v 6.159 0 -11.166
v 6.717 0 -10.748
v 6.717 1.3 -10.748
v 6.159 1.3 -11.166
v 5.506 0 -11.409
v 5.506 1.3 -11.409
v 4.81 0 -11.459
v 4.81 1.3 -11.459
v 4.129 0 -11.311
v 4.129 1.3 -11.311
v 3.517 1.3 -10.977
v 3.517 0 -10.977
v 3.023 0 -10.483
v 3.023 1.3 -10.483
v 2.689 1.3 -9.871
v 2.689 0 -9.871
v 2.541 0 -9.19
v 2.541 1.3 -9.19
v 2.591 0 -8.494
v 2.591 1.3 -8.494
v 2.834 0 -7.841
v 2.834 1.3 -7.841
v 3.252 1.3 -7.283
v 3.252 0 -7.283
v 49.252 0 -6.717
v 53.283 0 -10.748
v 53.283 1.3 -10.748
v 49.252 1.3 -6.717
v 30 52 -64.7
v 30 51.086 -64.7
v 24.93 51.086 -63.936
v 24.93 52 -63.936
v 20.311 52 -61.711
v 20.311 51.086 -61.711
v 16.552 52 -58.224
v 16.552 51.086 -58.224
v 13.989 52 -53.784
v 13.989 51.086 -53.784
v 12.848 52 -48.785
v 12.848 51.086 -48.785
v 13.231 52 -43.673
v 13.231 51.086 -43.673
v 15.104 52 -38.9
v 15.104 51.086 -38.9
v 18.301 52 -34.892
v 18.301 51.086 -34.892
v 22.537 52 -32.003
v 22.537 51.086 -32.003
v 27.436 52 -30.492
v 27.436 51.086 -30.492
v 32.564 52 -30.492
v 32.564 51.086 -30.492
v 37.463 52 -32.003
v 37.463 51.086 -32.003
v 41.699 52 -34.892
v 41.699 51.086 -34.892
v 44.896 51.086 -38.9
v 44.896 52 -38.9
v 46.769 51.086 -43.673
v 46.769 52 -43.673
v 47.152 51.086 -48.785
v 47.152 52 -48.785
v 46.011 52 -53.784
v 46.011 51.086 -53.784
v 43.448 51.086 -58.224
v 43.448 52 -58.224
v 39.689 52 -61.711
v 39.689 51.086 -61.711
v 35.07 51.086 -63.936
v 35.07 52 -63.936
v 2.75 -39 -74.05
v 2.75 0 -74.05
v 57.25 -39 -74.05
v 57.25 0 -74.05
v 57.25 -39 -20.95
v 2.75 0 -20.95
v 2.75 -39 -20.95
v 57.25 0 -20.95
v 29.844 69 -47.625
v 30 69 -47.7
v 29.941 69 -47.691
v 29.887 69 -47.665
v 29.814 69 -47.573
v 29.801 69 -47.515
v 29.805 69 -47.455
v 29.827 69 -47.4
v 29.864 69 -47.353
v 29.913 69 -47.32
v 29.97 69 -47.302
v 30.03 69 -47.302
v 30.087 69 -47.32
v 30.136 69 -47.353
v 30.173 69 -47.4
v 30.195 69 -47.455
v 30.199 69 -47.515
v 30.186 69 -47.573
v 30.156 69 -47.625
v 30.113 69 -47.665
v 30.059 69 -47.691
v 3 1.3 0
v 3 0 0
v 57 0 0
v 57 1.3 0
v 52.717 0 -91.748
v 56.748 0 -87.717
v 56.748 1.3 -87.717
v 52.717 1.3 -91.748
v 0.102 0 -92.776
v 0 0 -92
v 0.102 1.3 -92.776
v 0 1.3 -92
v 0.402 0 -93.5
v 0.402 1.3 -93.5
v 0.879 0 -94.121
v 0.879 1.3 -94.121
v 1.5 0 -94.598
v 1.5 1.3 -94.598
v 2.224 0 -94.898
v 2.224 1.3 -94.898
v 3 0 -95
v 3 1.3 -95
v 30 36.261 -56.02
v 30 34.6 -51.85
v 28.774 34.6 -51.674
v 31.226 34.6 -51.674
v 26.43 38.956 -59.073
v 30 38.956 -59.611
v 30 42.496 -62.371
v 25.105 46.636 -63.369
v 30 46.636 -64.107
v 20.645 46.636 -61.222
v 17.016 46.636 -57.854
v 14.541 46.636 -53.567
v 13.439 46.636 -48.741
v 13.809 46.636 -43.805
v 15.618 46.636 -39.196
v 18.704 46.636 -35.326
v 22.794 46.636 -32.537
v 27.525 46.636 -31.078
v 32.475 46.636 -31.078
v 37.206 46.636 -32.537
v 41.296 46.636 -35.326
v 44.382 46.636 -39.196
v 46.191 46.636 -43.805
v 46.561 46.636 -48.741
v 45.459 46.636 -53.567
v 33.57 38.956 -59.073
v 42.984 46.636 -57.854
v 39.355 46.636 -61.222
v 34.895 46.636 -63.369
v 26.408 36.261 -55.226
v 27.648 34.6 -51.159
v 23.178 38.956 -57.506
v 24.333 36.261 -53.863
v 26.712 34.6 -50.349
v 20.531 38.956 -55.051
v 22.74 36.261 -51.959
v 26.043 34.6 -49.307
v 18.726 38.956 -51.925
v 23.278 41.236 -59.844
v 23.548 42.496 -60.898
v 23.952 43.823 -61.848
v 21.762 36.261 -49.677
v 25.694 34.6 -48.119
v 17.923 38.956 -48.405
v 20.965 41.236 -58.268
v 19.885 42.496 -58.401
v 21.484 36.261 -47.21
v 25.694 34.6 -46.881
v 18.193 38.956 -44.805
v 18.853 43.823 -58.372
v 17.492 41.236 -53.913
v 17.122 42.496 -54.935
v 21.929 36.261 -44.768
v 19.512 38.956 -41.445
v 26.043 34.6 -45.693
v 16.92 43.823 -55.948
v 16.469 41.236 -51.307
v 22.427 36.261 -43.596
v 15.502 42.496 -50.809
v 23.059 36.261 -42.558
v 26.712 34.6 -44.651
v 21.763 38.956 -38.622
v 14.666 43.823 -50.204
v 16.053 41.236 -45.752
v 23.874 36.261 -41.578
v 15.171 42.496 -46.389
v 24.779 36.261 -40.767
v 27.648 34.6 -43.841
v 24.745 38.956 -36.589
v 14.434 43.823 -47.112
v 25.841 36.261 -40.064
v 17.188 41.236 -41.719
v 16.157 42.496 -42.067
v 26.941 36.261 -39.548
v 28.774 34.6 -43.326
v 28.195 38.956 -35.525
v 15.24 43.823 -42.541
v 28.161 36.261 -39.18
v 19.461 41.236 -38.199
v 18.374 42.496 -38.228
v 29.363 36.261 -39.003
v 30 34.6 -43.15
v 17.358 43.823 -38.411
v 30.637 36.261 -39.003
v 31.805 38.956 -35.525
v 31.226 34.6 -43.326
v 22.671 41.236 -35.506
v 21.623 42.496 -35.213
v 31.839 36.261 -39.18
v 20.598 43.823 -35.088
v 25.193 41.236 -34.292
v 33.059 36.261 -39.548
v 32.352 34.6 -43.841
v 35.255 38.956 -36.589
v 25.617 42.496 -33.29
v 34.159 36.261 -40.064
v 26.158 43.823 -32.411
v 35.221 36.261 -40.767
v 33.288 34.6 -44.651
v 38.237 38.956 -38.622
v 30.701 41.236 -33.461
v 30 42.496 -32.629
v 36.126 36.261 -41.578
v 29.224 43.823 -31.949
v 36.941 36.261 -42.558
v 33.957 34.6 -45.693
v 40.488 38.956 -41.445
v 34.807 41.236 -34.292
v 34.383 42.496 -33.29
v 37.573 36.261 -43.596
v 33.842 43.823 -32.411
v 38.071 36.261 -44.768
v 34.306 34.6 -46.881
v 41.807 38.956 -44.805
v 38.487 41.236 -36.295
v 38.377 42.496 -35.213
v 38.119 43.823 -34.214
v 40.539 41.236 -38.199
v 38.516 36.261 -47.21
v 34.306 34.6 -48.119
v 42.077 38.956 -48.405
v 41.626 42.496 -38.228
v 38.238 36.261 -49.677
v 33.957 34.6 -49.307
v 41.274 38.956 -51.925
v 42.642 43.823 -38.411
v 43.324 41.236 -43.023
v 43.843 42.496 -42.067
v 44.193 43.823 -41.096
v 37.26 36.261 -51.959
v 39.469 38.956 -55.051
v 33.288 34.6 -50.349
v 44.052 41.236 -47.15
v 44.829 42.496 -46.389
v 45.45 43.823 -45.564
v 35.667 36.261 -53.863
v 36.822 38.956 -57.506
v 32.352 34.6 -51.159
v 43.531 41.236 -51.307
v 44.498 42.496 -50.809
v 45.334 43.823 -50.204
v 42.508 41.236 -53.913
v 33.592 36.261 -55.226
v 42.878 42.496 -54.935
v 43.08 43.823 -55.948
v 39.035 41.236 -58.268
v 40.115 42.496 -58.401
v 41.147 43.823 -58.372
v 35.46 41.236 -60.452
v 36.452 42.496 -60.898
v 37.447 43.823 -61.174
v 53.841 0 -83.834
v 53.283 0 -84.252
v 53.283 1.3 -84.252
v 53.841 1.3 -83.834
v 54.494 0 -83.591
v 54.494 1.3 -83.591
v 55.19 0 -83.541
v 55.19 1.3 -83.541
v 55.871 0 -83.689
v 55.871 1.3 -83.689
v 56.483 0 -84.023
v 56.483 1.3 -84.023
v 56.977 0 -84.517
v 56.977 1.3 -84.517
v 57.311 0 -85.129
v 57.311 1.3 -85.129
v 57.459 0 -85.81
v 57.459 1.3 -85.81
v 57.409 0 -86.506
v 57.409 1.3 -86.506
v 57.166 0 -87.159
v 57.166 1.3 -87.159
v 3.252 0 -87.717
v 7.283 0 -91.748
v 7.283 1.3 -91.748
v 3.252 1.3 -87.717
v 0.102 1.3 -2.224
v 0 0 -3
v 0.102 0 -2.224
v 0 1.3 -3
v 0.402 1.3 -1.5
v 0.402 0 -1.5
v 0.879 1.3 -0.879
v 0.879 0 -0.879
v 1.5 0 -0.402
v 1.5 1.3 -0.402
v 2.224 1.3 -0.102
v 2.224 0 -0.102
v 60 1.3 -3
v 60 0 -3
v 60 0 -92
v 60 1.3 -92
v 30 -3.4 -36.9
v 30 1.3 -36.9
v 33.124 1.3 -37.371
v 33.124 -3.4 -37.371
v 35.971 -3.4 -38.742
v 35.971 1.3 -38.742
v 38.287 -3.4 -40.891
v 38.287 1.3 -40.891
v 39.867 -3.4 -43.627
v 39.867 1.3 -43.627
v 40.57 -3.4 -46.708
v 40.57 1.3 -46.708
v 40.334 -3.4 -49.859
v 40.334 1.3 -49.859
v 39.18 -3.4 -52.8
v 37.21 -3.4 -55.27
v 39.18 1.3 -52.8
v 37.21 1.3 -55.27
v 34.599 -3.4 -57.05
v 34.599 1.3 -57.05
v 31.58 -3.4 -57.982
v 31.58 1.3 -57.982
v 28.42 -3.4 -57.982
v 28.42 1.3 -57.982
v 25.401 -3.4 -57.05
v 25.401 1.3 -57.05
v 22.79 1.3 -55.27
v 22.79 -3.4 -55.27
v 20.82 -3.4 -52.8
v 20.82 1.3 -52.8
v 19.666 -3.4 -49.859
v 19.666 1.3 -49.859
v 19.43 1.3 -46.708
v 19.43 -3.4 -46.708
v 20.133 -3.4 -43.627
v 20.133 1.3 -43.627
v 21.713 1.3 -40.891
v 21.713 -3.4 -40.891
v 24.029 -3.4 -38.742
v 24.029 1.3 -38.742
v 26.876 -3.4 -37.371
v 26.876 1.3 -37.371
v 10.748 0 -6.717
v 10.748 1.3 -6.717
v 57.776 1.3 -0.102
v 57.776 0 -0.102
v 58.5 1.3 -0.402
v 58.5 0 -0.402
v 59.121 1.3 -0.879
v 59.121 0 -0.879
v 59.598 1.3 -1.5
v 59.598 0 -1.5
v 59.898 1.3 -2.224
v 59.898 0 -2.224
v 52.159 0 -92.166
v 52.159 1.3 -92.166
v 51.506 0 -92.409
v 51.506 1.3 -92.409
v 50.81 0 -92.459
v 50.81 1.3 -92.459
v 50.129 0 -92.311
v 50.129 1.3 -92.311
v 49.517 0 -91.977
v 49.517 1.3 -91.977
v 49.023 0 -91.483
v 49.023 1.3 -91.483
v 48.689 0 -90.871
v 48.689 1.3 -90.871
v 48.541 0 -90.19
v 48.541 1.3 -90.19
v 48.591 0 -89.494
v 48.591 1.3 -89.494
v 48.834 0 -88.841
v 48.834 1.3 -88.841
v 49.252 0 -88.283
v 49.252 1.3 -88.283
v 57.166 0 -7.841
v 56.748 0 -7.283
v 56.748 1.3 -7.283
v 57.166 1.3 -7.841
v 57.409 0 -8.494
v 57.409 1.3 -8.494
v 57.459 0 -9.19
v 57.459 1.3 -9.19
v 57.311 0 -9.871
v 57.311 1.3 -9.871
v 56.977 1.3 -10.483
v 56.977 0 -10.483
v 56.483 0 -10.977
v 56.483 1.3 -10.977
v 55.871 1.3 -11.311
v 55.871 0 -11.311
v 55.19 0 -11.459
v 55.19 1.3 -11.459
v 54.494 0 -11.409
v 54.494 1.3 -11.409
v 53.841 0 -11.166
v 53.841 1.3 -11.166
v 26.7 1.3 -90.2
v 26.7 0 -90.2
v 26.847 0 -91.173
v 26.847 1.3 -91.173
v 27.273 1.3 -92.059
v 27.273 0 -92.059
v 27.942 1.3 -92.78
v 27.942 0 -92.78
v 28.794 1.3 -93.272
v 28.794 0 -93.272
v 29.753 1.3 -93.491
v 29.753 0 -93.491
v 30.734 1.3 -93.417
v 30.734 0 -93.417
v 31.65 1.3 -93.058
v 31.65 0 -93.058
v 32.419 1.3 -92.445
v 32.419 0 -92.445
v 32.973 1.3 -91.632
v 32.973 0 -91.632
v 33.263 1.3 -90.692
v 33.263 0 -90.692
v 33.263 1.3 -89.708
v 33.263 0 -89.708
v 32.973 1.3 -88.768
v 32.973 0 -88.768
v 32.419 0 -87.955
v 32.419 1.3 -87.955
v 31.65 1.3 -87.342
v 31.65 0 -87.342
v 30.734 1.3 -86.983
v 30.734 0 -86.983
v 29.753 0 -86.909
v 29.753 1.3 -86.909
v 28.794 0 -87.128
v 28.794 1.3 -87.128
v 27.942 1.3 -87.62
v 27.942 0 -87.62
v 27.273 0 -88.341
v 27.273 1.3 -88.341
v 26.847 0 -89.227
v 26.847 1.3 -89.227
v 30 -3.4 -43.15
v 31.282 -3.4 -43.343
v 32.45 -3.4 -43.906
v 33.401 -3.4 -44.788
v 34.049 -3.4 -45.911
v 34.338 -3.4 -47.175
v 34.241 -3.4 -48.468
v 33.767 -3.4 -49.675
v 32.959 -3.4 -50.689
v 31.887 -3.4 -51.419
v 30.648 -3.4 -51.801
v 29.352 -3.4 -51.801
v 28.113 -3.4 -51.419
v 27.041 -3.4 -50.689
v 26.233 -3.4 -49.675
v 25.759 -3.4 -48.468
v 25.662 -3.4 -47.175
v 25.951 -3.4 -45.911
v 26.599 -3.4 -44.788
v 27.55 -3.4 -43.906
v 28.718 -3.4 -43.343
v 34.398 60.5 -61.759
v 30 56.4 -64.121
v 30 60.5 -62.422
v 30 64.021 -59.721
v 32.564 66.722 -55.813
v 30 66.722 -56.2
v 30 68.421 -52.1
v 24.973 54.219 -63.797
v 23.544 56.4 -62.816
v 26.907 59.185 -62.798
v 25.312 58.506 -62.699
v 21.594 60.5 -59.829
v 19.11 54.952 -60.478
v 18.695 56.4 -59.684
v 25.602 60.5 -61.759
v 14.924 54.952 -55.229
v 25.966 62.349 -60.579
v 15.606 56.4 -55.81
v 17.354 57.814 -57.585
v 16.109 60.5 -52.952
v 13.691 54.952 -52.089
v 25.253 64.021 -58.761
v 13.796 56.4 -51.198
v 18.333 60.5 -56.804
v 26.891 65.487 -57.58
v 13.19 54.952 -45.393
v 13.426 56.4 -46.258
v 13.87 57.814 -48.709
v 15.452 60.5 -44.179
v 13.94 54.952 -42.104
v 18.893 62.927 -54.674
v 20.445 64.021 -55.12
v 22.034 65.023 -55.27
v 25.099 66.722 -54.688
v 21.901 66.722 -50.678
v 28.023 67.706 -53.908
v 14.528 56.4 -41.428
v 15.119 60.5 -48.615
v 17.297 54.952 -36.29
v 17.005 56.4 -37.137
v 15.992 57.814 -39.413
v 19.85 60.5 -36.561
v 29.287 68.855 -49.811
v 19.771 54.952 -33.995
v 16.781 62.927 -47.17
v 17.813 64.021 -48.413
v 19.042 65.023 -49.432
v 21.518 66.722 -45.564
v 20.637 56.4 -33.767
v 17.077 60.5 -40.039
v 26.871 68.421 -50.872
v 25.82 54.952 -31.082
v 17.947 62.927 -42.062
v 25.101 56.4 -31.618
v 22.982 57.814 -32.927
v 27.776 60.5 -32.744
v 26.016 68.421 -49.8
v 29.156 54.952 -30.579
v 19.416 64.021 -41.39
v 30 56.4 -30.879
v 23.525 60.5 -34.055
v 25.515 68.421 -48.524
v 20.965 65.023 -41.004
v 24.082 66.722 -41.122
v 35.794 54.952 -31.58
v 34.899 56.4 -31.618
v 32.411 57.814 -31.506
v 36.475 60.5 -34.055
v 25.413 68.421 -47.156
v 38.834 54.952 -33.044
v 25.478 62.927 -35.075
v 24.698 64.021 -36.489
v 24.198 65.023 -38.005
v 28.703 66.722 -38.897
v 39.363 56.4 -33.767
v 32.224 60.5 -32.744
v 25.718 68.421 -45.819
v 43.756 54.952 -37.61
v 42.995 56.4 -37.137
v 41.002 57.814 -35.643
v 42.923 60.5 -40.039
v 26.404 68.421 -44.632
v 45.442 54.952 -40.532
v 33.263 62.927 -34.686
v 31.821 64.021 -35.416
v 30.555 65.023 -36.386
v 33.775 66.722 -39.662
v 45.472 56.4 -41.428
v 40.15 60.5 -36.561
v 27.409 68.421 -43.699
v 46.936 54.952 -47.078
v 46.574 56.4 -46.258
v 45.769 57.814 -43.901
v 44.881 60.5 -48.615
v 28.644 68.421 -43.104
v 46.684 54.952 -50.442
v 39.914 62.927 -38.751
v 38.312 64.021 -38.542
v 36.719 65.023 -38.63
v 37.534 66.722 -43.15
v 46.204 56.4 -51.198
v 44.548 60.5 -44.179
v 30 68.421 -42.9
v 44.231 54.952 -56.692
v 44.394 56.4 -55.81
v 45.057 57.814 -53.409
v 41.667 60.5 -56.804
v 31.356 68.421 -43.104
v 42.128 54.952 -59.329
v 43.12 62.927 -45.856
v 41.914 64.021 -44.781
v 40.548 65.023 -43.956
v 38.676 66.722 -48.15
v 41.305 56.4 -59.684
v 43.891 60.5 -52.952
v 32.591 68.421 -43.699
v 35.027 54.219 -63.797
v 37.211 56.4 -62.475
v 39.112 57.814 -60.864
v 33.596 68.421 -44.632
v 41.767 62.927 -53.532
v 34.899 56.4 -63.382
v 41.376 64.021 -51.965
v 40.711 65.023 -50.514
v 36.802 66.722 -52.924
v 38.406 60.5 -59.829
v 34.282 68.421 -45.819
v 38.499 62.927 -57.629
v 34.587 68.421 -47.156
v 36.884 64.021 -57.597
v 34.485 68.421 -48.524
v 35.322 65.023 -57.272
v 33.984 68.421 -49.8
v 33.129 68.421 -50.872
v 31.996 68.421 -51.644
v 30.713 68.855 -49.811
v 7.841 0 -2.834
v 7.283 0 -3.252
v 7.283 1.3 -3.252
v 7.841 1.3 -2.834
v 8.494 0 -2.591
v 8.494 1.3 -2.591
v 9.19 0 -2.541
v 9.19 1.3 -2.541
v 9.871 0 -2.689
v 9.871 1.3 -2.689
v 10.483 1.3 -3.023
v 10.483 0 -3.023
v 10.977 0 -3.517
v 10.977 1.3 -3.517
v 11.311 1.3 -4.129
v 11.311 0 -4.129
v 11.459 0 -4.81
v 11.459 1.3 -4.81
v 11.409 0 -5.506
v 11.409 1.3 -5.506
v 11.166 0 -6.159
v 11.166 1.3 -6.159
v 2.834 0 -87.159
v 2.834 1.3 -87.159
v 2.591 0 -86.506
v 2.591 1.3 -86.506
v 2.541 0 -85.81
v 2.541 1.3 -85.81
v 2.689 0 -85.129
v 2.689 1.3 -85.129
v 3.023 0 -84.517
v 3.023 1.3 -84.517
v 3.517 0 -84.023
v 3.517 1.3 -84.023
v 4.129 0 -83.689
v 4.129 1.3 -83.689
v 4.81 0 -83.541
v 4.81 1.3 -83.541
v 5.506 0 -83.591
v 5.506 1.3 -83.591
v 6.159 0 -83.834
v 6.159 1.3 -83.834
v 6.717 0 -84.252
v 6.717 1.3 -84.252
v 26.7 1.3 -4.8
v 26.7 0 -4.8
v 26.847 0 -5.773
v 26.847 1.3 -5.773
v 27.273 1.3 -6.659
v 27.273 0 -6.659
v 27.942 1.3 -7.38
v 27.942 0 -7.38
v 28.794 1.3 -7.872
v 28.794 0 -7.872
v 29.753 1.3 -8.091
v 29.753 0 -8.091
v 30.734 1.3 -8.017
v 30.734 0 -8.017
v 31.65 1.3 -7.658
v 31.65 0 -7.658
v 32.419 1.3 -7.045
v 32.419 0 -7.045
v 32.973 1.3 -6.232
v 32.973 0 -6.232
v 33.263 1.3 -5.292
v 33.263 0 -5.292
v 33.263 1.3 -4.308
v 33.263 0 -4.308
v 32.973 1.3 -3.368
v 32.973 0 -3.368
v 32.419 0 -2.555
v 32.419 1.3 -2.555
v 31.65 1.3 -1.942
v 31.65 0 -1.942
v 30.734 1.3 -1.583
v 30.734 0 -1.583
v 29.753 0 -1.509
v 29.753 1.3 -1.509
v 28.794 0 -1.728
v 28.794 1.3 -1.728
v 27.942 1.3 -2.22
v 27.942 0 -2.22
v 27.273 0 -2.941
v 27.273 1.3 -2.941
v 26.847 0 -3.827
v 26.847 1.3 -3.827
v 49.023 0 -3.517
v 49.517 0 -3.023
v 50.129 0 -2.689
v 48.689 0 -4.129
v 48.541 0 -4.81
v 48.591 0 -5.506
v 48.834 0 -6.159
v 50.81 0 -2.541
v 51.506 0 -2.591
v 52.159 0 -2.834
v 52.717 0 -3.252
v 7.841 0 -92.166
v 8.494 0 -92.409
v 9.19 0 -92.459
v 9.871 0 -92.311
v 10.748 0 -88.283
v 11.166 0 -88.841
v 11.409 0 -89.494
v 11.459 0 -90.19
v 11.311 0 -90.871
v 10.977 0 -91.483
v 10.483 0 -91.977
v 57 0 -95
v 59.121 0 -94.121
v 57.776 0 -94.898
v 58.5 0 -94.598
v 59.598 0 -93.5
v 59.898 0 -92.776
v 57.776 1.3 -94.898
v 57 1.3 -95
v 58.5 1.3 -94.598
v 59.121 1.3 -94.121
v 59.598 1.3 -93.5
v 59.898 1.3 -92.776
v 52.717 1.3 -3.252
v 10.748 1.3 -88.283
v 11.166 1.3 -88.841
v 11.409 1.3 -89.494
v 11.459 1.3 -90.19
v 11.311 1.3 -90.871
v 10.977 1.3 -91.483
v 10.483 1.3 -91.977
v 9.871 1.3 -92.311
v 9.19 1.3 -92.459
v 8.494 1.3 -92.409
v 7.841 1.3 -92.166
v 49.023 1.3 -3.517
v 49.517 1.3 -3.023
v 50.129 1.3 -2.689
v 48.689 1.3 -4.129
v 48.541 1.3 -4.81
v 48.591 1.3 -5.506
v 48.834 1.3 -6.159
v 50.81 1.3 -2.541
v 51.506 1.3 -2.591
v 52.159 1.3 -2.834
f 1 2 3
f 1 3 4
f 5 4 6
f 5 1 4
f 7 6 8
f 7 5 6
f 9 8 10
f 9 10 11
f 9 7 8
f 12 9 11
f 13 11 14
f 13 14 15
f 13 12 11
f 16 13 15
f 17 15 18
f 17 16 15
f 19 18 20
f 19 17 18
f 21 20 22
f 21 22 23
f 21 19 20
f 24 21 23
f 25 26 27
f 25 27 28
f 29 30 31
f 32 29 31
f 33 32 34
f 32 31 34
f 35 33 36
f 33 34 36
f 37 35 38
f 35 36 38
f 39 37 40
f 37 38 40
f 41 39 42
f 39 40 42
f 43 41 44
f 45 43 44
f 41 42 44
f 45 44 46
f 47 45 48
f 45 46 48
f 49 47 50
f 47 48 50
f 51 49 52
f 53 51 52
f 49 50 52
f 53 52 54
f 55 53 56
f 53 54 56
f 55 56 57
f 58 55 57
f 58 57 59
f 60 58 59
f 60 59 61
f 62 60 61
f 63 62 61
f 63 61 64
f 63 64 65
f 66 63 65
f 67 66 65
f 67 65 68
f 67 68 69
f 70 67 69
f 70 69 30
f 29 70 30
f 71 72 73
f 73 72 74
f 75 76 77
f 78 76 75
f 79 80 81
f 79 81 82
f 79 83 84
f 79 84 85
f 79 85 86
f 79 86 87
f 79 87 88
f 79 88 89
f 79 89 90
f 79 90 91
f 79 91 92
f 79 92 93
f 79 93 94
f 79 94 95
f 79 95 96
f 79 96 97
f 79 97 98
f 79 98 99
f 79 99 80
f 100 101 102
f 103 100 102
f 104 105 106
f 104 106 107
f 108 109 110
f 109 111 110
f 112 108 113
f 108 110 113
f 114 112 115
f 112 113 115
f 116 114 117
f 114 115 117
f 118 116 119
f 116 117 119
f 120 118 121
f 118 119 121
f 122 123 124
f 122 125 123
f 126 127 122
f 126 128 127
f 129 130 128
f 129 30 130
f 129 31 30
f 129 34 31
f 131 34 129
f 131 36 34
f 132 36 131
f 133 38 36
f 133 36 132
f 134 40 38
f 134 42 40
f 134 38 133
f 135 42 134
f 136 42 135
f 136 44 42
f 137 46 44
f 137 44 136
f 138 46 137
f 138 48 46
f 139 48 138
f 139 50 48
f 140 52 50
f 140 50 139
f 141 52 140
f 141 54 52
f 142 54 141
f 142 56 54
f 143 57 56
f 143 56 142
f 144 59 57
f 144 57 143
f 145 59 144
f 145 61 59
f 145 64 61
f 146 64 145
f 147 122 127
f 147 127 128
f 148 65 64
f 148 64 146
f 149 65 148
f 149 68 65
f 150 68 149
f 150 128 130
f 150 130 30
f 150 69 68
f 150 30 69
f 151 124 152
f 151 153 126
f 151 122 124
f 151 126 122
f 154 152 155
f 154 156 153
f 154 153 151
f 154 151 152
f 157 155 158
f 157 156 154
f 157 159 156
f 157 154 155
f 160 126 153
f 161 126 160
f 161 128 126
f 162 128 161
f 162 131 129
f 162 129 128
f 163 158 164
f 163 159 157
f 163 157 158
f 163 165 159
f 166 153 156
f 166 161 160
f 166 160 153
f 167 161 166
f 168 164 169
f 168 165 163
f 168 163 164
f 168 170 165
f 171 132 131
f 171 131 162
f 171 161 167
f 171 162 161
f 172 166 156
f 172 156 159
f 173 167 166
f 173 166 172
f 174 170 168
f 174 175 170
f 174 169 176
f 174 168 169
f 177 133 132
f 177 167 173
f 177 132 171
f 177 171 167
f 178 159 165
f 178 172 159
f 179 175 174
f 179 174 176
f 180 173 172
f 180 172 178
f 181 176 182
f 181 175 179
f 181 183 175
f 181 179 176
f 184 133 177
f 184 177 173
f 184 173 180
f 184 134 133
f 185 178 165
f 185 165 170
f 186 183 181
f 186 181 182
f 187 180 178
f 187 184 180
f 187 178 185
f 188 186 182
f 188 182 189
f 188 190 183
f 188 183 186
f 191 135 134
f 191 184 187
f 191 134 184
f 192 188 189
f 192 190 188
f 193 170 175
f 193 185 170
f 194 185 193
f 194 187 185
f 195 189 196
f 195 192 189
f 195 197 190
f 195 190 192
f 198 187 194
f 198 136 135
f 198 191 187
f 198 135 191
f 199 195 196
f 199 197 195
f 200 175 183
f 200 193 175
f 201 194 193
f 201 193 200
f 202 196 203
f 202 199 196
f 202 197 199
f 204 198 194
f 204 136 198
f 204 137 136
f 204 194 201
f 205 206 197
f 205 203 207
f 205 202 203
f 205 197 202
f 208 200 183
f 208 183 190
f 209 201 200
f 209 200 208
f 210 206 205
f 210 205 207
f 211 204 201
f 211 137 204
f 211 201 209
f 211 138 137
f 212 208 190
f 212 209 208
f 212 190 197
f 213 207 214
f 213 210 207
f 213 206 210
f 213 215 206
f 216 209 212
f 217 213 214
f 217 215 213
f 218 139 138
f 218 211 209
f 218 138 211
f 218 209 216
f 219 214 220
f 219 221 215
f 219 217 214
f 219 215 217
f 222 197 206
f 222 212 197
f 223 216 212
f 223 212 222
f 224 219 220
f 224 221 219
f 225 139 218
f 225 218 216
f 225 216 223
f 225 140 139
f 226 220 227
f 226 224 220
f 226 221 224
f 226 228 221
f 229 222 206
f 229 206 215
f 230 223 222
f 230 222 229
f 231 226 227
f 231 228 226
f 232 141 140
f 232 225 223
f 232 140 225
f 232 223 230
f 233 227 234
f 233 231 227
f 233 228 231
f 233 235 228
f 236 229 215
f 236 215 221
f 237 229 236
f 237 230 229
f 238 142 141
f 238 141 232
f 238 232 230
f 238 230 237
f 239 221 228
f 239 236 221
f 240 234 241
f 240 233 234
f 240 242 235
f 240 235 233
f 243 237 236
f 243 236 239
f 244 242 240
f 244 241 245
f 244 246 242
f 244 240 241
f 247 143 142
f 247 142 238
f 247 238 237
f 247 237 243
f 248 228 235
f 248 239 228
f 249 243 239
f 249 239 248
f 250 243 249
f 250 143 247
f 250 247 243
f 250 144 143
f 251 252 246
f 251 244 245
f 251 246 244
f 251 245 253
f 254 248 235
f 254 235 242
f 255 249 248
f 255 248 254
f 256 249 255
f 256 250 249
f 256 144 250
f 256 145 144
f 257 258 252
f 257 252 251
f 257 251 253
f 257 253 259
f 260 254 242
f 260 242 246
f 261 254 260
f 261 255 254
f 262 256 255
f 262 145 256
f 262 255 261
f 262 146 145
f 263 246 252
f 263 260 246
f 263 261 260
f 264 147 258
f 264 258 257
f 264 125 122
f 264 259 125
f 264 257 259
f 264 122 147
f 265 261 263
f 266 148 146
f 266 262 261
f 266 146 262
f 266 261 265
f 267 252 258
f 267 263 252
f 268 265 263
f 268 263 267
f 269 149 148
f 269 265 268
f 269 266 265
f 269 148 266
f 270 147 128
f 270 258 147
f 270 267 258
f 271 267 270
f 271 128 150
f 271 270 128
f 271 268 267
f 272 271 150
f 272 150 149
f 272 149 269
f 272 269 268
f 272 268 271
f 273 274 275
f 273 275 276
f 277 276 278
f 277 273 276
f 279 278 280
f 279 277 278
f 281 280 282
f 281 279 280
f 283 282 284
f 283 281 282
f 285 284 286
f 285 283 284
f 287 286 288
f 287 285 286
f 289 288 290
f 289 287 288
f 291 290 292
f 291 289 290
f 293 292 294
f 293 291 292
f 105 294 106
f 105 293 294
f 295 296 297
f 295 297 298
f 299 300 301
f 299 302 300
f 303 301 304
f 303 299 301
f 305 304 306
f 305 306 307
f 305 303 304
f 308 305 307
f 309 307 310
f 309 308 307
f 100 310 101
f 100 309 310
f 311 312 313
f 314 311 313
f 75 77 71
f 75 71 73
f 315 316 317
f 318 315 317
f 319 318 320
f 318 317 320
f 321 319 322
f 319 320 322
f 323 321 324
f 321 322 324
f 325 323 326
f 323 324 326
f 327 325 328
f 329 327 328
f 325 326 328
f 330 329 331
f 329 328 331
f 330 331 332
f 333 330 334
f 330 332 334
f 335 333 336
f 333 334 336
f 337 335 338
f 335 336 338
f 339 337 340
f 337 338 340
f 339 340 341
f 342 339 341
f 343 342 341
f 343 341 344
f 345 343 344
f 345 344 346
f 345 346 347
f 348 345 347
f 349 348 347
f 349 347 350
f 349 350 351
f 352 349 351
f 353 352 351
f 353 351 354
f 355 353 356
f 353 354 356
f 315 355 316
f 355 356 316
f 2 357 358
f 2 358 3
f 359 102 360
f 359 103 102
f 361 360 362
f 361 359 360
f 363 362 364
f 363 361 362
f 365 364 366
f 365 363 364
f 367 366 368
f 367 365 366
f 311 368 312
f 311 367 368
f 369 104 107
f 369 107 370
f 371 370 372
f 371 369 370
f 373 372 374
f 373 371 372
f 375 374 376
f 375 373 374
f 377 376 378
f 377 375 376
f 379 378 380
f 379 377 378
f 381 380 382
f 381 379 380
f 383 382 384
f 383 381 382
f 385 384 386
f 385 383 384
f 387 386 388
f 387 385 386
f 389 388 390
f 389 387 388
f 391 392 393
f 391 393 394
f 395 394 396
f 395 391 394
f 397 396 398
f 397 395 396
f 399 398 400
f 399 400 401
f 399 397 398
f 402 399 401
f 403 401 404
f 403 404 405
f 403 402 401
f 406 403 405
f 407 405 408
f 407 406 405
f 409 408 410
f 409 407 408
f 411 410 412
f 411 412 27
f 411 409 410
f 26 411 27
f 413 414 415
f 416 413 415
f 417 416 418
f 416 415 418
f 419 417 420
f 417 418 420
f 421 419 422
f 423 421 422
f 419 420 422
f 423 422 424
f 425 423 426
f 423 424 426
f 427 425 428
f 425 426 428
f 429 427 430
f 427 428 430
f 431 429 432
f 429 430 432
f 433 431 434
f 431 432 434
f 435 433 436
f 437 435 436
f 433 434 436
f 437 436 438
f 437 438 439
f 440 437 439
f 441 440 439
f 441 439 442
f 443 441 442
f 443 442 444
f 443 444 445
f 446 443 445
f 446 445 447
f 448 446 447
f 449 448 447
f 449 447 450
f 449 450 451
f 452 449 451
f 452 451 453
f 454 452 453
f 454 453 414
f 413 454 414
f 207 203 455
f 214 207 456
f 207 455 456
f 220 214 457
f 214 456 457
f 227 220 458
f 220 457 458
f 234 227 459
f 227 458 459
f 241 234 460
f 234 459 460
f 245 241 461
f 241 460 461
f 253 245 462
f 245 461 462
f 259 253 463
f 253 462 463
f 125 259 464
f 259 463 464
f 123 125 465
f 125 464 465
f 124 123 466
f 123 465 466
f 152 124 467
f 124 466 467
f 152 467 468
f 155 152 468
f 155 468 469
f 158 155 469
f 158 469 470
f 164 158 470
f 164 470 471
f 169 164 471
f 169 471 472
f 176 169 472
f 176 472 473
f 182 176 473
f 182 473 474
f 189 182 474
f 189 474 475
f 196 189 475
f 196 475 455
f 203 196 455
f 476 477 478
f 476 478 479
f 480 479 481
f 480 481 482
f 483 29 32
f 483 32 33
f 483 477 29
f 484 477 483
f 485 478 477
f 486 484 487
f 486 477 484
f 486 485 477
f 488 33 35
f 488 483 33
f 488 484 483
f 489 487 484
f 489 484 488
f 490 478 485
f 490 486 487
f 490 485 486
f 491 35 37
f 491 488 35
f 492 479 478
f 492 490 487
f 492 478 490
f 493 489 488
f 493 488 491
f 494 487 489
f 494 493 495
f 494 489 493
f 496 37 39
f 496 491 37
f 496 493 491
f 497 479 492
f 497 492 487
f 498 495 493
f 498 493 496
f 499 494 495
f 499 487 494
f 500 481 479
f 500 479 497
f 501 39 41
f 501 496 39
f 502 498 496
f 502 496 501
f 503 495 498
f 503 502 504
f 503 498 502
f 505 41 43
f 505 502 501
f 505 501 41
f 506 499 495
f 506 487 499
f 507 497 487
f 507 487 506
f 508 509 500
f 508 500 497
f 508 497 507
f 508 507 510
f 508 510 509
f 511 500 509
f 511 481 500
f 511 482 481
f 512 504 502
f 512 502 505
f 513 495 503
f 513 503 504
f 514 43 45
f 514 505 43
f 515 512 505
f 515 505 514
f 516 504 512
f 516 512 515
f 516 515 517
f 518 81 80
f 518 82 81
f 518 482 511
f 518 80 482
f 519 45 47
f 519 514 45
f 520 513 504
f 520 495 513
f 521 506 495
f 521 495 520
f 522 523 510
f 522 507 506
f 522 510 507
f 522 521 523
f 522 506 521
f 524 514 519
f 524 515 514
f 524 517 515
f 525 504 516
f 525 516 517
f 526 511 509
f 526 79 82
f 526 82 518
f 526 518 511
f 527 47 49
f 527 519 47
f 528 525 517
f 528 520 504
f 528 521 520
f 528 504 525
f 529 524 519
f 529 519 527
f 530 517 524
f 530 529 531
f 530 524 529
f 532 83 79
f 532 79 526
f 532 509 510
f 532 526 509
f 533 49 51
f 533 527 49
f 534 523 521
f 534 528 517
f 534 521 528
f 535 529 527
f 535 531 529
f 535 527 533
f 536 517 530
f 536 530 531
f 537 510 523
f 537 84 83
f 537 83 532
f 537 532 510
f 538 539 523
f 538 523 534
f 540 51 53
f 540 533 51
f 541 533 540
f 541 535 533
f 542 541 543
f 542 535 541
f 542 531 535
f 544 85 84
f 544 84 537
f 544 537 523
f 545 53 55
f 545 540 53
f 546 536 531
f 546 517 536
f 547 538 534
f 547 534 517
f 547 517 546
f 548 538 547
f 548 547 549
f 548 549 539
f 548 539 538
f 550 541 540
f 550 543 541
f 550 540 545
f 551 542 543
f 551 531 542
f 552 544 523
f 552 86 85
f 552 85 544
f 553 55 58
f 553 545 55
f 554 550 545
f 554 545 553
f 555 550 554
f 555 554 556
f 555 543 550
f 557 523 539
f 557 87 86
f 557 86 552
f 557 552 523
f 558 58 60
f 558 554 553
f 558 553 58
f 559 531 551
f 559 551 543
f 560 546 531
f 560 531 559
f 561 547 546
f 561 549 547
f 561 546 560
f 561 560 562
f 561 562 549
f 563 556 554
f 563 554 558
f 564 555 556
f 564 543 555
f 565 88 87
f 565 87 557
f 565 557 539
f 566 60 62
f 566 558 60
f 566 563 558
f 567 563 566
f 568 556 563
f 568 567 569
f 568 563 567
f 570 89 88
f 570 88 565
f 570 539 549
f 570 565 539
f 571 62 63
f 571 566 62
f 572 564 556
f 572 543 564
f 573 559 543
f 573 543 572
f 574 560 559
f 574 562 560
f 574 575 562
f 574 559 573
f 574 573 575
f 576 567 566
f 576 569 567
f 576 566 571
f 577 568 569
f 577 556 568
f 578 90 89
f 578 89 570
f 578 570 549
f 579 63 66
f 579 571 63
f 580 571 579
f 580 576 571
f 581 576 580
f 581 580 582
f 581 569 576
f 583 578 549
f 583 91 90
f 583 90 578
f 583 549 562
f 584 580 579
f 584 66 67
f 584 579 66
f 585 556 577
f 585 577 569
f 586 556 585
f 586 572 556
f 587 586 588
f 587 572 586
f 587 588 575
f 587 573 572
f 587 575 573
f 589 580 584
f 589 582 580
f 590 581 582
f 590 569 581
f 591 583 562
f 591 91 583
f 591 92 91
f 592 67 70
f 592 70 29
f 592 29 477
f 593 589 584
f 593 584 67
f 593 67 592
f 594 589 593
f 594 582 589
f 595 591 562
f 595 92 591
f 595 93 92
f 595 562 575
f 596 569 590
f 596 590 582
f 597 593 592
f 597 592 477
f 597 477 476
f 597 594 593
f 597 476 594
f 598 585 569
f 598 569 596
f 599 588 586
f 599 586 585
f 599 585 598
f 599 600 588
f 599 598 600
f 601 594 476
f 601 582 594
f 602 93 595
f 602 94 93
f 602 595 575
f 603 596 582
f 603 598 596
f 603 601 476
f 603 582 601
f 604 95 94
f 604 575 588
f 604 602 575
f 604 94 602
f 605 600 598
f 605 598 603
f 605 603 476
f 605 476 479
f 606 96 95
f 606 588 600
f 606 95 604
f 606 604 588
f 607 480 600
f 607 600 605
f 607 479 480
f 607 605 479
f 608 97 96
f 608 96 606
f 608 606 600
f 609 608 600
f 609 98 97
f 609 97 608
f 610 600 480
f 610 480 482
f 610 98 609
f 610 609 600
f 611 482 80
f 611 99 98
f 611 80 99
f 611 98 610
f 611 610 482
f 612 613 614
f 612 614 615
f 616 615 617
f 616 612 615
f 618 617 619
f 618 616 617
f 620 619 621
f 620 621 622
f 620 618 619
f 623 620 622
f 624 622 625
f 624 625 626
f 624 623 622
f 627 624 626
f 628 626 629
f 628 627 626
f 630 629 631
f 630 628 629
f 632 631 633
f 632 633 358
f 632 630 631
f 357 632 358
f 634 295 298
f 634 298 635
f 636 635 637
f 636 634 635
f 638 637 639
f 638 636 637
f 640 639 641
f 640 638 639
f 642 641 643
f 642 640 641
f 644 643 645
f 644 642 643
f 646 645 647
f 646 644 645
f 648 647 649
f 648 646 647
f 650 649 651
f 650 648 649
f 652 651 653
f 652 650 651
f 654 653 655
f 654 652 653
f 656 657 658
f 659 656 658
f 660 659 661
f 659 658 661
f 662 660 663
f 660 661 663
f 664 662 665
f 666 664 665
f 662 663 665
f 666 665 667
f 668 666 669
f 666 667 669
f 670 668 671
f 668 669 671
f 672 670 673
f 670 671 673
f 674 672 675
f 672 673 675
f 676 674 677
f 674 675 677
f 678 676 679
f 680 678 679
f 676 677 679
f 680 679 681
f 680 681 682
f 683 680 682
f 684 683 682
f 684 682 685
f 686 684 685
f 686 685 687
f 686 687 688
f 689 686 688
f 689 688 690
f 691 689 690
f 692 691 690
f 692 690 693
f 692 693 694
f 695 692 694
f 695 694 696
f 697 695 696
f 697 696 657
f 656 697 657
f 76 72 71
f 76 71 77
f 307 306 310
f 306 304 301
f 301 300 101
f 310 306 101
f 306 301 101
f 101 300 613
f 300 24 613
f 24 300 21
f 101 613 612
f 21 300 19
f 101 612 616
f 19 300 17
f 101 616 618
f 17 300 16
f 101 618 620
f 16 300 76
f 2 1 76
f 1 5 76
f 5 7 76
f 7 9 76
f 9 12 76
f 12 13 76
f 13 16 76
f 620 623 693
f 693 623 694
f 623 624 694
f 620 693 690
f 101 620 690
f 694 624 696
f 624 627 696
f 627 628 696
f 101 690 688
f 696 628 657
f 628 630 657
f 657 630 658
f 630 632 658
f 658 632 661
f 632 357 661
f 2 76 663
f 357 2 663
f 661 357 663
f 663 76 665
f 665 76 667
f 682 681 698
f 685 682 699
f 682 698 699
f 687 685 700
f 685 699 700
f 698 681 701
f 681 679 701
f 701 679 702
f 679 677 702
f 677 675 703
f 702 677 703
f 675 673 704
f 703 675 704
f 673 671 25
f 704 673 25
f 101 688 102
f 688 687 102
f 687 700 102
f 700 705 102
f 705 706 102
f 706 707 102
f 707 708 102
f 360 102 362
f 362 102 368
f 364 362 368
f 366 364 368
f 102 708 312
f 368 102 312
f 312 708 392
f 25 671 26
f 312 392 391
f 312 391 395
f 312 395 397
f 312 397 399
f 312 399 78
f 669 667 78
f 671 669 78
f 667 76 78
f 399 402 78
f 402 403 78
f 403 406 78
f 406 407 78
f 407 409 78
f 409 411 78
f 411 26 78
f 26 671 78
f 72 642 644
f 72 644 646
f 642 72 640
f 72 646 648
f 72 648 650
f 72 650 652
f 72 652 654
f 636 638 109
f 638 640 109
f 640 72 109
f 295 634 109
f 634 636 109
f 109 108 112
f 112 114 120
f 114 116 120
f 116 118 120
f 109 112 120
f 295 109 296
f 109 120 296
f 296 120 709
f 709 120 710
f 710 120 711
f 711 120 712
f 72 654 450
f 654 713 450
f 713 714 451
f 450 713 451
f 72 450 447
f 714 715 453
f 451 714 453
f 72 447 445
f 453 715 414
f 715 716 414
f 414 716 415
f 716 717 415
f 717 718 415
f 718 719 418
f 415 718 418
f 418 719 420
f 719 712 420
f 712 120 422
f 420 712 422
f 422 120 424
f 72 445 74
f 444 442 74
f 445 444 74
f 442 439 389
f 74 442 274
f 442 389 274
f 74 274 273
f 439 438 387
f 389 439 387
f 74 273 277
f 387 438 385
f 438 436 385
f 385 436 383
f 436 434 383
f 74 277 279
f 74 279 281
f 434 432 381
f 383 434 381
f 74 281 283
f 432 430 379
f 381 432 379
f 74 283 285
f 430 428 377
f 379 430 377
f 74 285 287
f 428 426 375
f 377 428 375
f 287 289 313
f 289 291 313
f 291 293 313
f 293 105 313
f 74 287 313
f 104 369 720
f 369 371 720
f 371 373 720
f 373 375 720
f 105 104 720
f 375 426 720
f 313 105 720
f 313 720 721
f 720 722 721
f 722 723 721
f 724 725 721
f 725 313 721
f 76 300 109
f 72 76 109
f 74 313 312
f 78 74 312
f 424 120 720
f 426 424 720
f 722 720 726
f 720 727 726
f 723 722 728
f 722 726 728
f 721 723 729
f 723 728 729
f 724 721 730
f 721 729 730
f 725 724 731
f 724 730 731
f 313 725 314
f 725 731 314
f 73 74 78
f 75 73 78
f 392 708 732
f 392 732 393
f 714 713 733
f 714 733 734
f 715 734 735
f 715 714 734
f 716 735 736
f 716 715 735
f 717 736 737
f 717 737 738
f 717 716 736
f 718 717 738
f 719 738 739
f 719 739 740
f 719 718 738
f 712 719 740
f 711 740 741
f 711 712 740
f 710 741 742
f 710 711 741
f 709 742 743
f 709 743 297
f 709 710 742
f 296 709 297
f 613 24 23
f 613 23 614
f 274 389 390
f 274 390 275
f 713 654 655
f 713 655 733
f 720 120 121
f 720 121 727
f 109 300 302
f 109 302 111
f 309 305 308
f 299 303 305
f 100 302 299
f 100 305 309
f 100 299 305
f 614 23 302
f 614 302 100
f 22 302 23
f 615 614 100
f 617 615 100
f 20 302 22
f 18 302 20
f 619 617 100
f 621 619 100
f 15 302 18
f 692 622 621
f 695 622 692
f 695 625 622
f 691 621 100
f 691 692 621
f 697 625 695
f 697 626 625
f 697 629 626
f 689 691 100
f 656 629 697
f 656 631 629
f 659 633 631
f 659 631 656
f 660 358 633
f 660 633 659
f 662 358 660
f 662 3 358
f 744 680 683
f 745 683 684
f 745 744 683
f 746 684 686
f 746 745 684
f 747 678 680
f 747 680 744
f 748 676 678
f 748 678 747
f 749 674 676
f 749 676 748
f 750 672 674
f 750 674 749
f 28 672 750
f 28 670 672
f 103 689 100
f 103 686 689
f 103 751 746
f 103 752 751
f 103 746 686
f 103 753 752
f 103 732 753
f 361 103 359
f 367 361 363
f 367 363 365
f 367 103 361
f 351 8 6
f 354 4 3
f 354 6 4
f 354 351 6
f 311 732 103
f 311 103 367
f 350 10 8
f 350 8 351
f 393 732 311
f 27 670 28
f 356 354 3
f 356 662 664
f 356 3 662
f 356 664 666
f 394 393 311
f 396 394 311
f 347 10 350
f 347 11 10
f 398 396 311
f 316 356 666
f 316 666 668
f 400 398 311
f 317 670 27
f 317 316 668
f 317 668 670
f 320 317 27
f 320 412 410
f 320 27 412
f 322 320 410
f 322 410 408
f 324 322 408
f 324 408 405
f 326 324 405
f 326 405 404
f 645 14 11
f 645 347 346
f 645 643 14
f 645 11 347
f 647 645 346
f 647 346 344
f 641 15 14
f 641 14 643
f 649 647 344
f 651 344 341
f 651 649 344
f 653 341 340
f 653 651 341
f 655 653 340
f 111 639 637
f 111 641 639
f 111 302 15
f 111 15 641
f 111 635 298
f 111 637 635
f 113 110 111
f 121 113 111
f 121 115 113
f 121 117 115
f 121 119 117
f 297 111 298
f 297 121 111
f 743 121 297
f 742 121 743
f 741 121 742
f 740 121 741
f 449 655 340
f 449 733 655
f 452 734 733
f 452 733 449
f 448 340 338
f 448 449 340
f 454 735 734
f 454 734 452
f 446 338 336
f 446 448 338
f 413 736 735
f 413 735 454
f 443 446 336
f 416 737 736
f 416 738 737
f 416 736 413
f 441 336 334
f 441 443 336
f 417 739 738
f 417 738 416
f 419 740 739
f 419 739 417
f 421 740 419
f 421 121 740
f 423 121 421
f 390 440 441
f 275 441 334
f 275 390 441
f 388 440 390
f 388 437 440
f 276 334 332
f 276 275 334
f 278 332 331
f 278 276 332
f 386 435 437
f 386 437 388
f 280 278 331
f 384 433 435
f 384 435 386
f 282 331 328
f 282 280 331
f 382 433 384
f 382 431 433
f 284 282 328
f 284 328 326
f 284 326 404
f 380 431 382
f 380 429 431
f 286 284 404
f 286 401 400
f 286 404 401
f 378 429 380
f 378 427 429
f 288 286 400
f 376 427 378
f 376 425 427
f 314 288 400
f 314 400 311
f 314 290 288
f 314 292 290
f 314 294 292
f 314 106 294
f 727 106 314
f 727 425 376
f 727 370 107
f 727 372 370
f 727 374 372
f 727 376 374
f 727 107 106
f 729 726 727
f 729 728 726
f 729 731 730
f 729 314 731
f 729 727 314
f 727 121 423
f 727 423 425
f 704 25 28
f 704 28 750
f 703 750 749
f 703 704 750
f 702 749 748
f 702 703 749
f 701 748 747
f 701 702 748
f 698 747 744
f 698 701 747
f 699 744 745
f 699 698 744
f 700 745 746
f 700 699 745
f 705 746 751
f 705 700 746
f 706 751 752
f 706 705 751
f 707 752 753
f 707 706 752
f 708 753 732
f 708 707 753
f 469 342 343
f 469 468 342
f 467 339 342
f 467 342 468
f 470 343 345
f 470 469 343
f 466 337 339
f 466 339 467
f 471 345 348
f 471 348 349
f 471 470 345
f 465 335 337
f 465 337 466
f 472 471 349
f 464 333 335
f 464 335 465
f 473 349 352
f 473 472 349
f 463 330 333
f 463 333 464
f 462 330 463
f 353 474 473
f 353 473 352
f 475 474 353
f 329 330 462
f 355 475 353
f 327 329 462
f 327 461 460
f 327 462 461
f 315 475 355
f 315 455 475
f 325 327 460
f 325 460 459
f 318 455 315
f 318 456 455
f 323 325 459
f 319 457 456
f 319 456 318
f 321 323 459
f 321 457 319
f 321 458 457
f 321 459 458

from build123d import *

# Parameters (mm, degrees)
SKETCH1_W                = 60
SKETCH1_H                = 95
BOSS_EXTRUDE1_DEPTH      = 1.3
SKETCH3_W                = 54.5
SKETCH3_H                = 53.1
BOSS_EXTRUDE2_DEPTH      = 39
SKETCH2_R                = 10.6
CUT_EXTRUDE1_DEPTH       = 4.7
SKETCH4_R                = 4.35
BOSS_EXTRUDE3_DEPTH      = 38
SKETCH5_R                = 17.2
BOSS_EXTRUDE4_DEPTH      = 34.4
FILLET1_R                = 17
M6_CLEARANCE_SLOT1_D     = 6.6
M5_CLEARANCE_SLOT1_DEPTH = 1.3
M5_CLEARANCE_SLOT2_DEPTH = 1.3
FILLET2_R                = 3


# Read off the part's stored shape, not the designer's step: M5 Clearance Slot1, M5 Clearance Slot2
with BuildPart() as part:
    # Sketch1 → Boss-Extrude1 (new body)
    with BuildSketch(Plane(origin=(0, 0, 0), x_dir=(1, 0, 0), z_dir=(0, 1, 0))):
        with Locations((30, 47.5)):
            Rectangle(SKETCH1_W, SKETCH1_H)
    extrude(amount=BOSS_EXTRUDE1_DEPTH)

    # Sketch3 → Boss-Extrude2 (add)
    with BuildSketch(Plane.XZ):
        with Locations((30, -47.5)):
            Rectangle(SKETCH3_W, SKETCH3_H)
    extrude(amount=BOSS_EXTRUDE2_DEPTH)

    # Sketch2 → Cut-Extrude1 (cut)
    with BuildSketch(Plane(origin=(0, 1.3, 0), x_dir=(1, 0, 0), z_dir=(0, 1, 0))):
        with Locations(Location((30, 47.5, 0), (0, 0, 270))):
            Circle(SKETCH2_R)
    extrude(amount=-CUT_EXTRUDE1_DEPTH, mode=Mode.SUBTRACT)

    # Sketch4 → Boss-Extrude3 (add)
    with BuildSketch(Plane(origin=(0, -3.4, 0), x_dir=(1, 0, 0), z_dir=(0, 1, 0))):
        with Locations(Location((30, 47.5, 0), (0, 0, 270))):
            Circle(SKETCH4_R)
    extrude(amount=BOSS_EXTRUDE3_DEPTH)

    # Sketch5 → Boss-Extrude4 (add)
    with BuildSketch(Plane(origin=(0, 34.6, 0), x_dir=(1, 0, 0), z_dir=(0, 1, 0))):
        with Locations(Location((30, 47.5, 0), (0, 0, 90))):
            Circle(SKETCH5_R)
    extrude(amount=BOSS_EXTRUDE4_DEPTH)

    # Fillet1
    # the kernel refuses this fillet: 17 mm, written as the material it takes off along each edge
    with BuildSketch(Plane(origin=(30, 34.6, -47.5), x_dir=(0, 0, -1), z_dir=(1, 0, 0))) as fillet1_piece_1:
        with BuildLine():
            CenterArc((0.2, 16.4856756), FILLET1_R, 284.129695419, 75.870304581)
            Line((4.35, 0), (4.433, -0.329713512))
            ThreePointArc((4.433, -0.329713512), (10.775, -0.34), (17.2, -0.34))
            Line((17.2, -0.34), (17.54, 0))
            Line((17.54, 0), (17.54, 16.4856756))
            Line((17.54, 16.4856756), (17.2, 16.4856756))
        make_face()
    revolve(axis=Axis((30, 34.6, -47.5), (0, 1, 0)), mode=Mode.SUBTRACT)
    with BuildSketch(Plane(origin=(30, 69, -47.5), x_dir=(0, 0, -1), z_dir=(1, 0, 0))) as fillet1_piece_2:
        with BuildLine():
            CenterArc((17.2 - FILLET1_R, -FILLET1_R), FILLET1_R, 0, 90)
            Line((17.2 - FILLET1_R, 0), (17.2 - FILLET1_R, FILLET1_R * 0.02))
            Line((17.2 - FILLET1_R, FILLET1_R * 0.02), (17.2, FILLET1_R * 0.02))
            Line((17.2, FILLET1_R * 0.02), (17.2 + FILLET1_R * 0.02, 0))
            Line((17.2 + FILLET1_R * 0.02, 0), (17.2 + FILLET1_R * 0.02, -FILLET1_R))
            Line((17.2 + FILLET1_R * 0.02, -FILLET1_R), (17.2, -FILLET1_R))
        make_face()
    revolve(axis=Axis((30, 69, -47.5), (0, 1, 0)), mode=Mode.SUBTRACT)

    # M6 Clearance Slot1 (through all)
    with Locations(Plane(origin=(0, 1.3, 0), x_dir=(1, 0, 0), z_dir=(0, 1, 0))):
        with Locations((30, 4.8), (30, 90.2)):
            Hole(M6_CLEARANCE_SLOT1_D / 2)

    # M5 Clearance Slot1 outline → M5 Clearance Slot1 (cut)
    with BuildSketch(Plane(origin=(0, 0, 0), x_dir=(1, 0, 0), z_dir=(0, 1, 0))):
        with BuildLine():
            Line((52.717157288, 3.25233406), (56.74766594, 7.282842712))
            ThreePointArc((56.74766594, 7.282842712), (56.74766594, 10.74766594), (53.282842712, 10.74766594))
            Line((53.282842712, 10.74766594), (49.25233406, 6.717157288))
            ThreePointArc((49.25233406, 6.717157288), (49.25233406, 3.25233406), (52.717157288, 3.25233406))
        make_face()
        with BuildLine():
            Line((6.717157288, 84.25233406), (10.74766594, 88.282842712))
            ThreePointArc((10.74766594, 88.282842712), (10.74766594, 91.74766594), (7.282842712, 91.74766594))
            Line((7.282842712, 91.74766594), (3.25233406, 87.717157288))
            ThreePointArc((3.25233406, 87.717157288), (3.25233406, 84.25233406), (6.717157288, 84.25233406))
        make_face()
    extrude(amount=M5_CLEARANCE_SLOT1_DEPTH, mode=Mode.SUBTRACT)

    # M5 Clearance Slot2 outline → M5 Clearance Slot2 (cut)
    with BuildSketch(Plane(origin=(0, 0, 0), x_dir=(1, 0, 0), z_dir=(0, 1, 0))):
        with BuildLine():
            Line((49.25233406, 88.282842712), (53.282842712, 84.25233406))
            ThreePointArc((53.282842712, 84.25233406), (56.74766594, 84.25233406), (56.74766594, 87.717157288))
            Line((56.74766594, 87.717157288), (52.717157288, 91.74766594))
            ThreePointArc((52.717157288, 91.74766594), (49.25233406, 91.74766594), (49.25233406, 88.282842712))
        make_face()
        with BuildLine():
            Line((3.25233406, 7.282842712), (7.282842712, 3.25233406))
            ThreePointArc((7.282842712, 3.25233406), (10.74766594, 3.25233406), (10.74766594, 6.717157288))
            Line((10.74766594, 6.717157288), (6.717157288, 10.74766594))
            ThreePointArc((6.717157288, 10.74766594), (3.25233406, 10.74766594), (3.25233406, 7.282842712))
        make_face()
    extrude(amount=M5_CLEARANCE_SLOT2_DEPTH, mode=Mode.SUBTRACT)

    # Fillet2
    fillet2_edges = [part.edges().sort_by_distance(p)[0] for p in [
        (0, 0.65, -95),
        (60, 0.65, -95),
        (60, 0.65, 0),
        (0, 0.65, 0),
    ]]
    fillet(fillet2_edges, radius=FILLET2_R)


solid = part.part
